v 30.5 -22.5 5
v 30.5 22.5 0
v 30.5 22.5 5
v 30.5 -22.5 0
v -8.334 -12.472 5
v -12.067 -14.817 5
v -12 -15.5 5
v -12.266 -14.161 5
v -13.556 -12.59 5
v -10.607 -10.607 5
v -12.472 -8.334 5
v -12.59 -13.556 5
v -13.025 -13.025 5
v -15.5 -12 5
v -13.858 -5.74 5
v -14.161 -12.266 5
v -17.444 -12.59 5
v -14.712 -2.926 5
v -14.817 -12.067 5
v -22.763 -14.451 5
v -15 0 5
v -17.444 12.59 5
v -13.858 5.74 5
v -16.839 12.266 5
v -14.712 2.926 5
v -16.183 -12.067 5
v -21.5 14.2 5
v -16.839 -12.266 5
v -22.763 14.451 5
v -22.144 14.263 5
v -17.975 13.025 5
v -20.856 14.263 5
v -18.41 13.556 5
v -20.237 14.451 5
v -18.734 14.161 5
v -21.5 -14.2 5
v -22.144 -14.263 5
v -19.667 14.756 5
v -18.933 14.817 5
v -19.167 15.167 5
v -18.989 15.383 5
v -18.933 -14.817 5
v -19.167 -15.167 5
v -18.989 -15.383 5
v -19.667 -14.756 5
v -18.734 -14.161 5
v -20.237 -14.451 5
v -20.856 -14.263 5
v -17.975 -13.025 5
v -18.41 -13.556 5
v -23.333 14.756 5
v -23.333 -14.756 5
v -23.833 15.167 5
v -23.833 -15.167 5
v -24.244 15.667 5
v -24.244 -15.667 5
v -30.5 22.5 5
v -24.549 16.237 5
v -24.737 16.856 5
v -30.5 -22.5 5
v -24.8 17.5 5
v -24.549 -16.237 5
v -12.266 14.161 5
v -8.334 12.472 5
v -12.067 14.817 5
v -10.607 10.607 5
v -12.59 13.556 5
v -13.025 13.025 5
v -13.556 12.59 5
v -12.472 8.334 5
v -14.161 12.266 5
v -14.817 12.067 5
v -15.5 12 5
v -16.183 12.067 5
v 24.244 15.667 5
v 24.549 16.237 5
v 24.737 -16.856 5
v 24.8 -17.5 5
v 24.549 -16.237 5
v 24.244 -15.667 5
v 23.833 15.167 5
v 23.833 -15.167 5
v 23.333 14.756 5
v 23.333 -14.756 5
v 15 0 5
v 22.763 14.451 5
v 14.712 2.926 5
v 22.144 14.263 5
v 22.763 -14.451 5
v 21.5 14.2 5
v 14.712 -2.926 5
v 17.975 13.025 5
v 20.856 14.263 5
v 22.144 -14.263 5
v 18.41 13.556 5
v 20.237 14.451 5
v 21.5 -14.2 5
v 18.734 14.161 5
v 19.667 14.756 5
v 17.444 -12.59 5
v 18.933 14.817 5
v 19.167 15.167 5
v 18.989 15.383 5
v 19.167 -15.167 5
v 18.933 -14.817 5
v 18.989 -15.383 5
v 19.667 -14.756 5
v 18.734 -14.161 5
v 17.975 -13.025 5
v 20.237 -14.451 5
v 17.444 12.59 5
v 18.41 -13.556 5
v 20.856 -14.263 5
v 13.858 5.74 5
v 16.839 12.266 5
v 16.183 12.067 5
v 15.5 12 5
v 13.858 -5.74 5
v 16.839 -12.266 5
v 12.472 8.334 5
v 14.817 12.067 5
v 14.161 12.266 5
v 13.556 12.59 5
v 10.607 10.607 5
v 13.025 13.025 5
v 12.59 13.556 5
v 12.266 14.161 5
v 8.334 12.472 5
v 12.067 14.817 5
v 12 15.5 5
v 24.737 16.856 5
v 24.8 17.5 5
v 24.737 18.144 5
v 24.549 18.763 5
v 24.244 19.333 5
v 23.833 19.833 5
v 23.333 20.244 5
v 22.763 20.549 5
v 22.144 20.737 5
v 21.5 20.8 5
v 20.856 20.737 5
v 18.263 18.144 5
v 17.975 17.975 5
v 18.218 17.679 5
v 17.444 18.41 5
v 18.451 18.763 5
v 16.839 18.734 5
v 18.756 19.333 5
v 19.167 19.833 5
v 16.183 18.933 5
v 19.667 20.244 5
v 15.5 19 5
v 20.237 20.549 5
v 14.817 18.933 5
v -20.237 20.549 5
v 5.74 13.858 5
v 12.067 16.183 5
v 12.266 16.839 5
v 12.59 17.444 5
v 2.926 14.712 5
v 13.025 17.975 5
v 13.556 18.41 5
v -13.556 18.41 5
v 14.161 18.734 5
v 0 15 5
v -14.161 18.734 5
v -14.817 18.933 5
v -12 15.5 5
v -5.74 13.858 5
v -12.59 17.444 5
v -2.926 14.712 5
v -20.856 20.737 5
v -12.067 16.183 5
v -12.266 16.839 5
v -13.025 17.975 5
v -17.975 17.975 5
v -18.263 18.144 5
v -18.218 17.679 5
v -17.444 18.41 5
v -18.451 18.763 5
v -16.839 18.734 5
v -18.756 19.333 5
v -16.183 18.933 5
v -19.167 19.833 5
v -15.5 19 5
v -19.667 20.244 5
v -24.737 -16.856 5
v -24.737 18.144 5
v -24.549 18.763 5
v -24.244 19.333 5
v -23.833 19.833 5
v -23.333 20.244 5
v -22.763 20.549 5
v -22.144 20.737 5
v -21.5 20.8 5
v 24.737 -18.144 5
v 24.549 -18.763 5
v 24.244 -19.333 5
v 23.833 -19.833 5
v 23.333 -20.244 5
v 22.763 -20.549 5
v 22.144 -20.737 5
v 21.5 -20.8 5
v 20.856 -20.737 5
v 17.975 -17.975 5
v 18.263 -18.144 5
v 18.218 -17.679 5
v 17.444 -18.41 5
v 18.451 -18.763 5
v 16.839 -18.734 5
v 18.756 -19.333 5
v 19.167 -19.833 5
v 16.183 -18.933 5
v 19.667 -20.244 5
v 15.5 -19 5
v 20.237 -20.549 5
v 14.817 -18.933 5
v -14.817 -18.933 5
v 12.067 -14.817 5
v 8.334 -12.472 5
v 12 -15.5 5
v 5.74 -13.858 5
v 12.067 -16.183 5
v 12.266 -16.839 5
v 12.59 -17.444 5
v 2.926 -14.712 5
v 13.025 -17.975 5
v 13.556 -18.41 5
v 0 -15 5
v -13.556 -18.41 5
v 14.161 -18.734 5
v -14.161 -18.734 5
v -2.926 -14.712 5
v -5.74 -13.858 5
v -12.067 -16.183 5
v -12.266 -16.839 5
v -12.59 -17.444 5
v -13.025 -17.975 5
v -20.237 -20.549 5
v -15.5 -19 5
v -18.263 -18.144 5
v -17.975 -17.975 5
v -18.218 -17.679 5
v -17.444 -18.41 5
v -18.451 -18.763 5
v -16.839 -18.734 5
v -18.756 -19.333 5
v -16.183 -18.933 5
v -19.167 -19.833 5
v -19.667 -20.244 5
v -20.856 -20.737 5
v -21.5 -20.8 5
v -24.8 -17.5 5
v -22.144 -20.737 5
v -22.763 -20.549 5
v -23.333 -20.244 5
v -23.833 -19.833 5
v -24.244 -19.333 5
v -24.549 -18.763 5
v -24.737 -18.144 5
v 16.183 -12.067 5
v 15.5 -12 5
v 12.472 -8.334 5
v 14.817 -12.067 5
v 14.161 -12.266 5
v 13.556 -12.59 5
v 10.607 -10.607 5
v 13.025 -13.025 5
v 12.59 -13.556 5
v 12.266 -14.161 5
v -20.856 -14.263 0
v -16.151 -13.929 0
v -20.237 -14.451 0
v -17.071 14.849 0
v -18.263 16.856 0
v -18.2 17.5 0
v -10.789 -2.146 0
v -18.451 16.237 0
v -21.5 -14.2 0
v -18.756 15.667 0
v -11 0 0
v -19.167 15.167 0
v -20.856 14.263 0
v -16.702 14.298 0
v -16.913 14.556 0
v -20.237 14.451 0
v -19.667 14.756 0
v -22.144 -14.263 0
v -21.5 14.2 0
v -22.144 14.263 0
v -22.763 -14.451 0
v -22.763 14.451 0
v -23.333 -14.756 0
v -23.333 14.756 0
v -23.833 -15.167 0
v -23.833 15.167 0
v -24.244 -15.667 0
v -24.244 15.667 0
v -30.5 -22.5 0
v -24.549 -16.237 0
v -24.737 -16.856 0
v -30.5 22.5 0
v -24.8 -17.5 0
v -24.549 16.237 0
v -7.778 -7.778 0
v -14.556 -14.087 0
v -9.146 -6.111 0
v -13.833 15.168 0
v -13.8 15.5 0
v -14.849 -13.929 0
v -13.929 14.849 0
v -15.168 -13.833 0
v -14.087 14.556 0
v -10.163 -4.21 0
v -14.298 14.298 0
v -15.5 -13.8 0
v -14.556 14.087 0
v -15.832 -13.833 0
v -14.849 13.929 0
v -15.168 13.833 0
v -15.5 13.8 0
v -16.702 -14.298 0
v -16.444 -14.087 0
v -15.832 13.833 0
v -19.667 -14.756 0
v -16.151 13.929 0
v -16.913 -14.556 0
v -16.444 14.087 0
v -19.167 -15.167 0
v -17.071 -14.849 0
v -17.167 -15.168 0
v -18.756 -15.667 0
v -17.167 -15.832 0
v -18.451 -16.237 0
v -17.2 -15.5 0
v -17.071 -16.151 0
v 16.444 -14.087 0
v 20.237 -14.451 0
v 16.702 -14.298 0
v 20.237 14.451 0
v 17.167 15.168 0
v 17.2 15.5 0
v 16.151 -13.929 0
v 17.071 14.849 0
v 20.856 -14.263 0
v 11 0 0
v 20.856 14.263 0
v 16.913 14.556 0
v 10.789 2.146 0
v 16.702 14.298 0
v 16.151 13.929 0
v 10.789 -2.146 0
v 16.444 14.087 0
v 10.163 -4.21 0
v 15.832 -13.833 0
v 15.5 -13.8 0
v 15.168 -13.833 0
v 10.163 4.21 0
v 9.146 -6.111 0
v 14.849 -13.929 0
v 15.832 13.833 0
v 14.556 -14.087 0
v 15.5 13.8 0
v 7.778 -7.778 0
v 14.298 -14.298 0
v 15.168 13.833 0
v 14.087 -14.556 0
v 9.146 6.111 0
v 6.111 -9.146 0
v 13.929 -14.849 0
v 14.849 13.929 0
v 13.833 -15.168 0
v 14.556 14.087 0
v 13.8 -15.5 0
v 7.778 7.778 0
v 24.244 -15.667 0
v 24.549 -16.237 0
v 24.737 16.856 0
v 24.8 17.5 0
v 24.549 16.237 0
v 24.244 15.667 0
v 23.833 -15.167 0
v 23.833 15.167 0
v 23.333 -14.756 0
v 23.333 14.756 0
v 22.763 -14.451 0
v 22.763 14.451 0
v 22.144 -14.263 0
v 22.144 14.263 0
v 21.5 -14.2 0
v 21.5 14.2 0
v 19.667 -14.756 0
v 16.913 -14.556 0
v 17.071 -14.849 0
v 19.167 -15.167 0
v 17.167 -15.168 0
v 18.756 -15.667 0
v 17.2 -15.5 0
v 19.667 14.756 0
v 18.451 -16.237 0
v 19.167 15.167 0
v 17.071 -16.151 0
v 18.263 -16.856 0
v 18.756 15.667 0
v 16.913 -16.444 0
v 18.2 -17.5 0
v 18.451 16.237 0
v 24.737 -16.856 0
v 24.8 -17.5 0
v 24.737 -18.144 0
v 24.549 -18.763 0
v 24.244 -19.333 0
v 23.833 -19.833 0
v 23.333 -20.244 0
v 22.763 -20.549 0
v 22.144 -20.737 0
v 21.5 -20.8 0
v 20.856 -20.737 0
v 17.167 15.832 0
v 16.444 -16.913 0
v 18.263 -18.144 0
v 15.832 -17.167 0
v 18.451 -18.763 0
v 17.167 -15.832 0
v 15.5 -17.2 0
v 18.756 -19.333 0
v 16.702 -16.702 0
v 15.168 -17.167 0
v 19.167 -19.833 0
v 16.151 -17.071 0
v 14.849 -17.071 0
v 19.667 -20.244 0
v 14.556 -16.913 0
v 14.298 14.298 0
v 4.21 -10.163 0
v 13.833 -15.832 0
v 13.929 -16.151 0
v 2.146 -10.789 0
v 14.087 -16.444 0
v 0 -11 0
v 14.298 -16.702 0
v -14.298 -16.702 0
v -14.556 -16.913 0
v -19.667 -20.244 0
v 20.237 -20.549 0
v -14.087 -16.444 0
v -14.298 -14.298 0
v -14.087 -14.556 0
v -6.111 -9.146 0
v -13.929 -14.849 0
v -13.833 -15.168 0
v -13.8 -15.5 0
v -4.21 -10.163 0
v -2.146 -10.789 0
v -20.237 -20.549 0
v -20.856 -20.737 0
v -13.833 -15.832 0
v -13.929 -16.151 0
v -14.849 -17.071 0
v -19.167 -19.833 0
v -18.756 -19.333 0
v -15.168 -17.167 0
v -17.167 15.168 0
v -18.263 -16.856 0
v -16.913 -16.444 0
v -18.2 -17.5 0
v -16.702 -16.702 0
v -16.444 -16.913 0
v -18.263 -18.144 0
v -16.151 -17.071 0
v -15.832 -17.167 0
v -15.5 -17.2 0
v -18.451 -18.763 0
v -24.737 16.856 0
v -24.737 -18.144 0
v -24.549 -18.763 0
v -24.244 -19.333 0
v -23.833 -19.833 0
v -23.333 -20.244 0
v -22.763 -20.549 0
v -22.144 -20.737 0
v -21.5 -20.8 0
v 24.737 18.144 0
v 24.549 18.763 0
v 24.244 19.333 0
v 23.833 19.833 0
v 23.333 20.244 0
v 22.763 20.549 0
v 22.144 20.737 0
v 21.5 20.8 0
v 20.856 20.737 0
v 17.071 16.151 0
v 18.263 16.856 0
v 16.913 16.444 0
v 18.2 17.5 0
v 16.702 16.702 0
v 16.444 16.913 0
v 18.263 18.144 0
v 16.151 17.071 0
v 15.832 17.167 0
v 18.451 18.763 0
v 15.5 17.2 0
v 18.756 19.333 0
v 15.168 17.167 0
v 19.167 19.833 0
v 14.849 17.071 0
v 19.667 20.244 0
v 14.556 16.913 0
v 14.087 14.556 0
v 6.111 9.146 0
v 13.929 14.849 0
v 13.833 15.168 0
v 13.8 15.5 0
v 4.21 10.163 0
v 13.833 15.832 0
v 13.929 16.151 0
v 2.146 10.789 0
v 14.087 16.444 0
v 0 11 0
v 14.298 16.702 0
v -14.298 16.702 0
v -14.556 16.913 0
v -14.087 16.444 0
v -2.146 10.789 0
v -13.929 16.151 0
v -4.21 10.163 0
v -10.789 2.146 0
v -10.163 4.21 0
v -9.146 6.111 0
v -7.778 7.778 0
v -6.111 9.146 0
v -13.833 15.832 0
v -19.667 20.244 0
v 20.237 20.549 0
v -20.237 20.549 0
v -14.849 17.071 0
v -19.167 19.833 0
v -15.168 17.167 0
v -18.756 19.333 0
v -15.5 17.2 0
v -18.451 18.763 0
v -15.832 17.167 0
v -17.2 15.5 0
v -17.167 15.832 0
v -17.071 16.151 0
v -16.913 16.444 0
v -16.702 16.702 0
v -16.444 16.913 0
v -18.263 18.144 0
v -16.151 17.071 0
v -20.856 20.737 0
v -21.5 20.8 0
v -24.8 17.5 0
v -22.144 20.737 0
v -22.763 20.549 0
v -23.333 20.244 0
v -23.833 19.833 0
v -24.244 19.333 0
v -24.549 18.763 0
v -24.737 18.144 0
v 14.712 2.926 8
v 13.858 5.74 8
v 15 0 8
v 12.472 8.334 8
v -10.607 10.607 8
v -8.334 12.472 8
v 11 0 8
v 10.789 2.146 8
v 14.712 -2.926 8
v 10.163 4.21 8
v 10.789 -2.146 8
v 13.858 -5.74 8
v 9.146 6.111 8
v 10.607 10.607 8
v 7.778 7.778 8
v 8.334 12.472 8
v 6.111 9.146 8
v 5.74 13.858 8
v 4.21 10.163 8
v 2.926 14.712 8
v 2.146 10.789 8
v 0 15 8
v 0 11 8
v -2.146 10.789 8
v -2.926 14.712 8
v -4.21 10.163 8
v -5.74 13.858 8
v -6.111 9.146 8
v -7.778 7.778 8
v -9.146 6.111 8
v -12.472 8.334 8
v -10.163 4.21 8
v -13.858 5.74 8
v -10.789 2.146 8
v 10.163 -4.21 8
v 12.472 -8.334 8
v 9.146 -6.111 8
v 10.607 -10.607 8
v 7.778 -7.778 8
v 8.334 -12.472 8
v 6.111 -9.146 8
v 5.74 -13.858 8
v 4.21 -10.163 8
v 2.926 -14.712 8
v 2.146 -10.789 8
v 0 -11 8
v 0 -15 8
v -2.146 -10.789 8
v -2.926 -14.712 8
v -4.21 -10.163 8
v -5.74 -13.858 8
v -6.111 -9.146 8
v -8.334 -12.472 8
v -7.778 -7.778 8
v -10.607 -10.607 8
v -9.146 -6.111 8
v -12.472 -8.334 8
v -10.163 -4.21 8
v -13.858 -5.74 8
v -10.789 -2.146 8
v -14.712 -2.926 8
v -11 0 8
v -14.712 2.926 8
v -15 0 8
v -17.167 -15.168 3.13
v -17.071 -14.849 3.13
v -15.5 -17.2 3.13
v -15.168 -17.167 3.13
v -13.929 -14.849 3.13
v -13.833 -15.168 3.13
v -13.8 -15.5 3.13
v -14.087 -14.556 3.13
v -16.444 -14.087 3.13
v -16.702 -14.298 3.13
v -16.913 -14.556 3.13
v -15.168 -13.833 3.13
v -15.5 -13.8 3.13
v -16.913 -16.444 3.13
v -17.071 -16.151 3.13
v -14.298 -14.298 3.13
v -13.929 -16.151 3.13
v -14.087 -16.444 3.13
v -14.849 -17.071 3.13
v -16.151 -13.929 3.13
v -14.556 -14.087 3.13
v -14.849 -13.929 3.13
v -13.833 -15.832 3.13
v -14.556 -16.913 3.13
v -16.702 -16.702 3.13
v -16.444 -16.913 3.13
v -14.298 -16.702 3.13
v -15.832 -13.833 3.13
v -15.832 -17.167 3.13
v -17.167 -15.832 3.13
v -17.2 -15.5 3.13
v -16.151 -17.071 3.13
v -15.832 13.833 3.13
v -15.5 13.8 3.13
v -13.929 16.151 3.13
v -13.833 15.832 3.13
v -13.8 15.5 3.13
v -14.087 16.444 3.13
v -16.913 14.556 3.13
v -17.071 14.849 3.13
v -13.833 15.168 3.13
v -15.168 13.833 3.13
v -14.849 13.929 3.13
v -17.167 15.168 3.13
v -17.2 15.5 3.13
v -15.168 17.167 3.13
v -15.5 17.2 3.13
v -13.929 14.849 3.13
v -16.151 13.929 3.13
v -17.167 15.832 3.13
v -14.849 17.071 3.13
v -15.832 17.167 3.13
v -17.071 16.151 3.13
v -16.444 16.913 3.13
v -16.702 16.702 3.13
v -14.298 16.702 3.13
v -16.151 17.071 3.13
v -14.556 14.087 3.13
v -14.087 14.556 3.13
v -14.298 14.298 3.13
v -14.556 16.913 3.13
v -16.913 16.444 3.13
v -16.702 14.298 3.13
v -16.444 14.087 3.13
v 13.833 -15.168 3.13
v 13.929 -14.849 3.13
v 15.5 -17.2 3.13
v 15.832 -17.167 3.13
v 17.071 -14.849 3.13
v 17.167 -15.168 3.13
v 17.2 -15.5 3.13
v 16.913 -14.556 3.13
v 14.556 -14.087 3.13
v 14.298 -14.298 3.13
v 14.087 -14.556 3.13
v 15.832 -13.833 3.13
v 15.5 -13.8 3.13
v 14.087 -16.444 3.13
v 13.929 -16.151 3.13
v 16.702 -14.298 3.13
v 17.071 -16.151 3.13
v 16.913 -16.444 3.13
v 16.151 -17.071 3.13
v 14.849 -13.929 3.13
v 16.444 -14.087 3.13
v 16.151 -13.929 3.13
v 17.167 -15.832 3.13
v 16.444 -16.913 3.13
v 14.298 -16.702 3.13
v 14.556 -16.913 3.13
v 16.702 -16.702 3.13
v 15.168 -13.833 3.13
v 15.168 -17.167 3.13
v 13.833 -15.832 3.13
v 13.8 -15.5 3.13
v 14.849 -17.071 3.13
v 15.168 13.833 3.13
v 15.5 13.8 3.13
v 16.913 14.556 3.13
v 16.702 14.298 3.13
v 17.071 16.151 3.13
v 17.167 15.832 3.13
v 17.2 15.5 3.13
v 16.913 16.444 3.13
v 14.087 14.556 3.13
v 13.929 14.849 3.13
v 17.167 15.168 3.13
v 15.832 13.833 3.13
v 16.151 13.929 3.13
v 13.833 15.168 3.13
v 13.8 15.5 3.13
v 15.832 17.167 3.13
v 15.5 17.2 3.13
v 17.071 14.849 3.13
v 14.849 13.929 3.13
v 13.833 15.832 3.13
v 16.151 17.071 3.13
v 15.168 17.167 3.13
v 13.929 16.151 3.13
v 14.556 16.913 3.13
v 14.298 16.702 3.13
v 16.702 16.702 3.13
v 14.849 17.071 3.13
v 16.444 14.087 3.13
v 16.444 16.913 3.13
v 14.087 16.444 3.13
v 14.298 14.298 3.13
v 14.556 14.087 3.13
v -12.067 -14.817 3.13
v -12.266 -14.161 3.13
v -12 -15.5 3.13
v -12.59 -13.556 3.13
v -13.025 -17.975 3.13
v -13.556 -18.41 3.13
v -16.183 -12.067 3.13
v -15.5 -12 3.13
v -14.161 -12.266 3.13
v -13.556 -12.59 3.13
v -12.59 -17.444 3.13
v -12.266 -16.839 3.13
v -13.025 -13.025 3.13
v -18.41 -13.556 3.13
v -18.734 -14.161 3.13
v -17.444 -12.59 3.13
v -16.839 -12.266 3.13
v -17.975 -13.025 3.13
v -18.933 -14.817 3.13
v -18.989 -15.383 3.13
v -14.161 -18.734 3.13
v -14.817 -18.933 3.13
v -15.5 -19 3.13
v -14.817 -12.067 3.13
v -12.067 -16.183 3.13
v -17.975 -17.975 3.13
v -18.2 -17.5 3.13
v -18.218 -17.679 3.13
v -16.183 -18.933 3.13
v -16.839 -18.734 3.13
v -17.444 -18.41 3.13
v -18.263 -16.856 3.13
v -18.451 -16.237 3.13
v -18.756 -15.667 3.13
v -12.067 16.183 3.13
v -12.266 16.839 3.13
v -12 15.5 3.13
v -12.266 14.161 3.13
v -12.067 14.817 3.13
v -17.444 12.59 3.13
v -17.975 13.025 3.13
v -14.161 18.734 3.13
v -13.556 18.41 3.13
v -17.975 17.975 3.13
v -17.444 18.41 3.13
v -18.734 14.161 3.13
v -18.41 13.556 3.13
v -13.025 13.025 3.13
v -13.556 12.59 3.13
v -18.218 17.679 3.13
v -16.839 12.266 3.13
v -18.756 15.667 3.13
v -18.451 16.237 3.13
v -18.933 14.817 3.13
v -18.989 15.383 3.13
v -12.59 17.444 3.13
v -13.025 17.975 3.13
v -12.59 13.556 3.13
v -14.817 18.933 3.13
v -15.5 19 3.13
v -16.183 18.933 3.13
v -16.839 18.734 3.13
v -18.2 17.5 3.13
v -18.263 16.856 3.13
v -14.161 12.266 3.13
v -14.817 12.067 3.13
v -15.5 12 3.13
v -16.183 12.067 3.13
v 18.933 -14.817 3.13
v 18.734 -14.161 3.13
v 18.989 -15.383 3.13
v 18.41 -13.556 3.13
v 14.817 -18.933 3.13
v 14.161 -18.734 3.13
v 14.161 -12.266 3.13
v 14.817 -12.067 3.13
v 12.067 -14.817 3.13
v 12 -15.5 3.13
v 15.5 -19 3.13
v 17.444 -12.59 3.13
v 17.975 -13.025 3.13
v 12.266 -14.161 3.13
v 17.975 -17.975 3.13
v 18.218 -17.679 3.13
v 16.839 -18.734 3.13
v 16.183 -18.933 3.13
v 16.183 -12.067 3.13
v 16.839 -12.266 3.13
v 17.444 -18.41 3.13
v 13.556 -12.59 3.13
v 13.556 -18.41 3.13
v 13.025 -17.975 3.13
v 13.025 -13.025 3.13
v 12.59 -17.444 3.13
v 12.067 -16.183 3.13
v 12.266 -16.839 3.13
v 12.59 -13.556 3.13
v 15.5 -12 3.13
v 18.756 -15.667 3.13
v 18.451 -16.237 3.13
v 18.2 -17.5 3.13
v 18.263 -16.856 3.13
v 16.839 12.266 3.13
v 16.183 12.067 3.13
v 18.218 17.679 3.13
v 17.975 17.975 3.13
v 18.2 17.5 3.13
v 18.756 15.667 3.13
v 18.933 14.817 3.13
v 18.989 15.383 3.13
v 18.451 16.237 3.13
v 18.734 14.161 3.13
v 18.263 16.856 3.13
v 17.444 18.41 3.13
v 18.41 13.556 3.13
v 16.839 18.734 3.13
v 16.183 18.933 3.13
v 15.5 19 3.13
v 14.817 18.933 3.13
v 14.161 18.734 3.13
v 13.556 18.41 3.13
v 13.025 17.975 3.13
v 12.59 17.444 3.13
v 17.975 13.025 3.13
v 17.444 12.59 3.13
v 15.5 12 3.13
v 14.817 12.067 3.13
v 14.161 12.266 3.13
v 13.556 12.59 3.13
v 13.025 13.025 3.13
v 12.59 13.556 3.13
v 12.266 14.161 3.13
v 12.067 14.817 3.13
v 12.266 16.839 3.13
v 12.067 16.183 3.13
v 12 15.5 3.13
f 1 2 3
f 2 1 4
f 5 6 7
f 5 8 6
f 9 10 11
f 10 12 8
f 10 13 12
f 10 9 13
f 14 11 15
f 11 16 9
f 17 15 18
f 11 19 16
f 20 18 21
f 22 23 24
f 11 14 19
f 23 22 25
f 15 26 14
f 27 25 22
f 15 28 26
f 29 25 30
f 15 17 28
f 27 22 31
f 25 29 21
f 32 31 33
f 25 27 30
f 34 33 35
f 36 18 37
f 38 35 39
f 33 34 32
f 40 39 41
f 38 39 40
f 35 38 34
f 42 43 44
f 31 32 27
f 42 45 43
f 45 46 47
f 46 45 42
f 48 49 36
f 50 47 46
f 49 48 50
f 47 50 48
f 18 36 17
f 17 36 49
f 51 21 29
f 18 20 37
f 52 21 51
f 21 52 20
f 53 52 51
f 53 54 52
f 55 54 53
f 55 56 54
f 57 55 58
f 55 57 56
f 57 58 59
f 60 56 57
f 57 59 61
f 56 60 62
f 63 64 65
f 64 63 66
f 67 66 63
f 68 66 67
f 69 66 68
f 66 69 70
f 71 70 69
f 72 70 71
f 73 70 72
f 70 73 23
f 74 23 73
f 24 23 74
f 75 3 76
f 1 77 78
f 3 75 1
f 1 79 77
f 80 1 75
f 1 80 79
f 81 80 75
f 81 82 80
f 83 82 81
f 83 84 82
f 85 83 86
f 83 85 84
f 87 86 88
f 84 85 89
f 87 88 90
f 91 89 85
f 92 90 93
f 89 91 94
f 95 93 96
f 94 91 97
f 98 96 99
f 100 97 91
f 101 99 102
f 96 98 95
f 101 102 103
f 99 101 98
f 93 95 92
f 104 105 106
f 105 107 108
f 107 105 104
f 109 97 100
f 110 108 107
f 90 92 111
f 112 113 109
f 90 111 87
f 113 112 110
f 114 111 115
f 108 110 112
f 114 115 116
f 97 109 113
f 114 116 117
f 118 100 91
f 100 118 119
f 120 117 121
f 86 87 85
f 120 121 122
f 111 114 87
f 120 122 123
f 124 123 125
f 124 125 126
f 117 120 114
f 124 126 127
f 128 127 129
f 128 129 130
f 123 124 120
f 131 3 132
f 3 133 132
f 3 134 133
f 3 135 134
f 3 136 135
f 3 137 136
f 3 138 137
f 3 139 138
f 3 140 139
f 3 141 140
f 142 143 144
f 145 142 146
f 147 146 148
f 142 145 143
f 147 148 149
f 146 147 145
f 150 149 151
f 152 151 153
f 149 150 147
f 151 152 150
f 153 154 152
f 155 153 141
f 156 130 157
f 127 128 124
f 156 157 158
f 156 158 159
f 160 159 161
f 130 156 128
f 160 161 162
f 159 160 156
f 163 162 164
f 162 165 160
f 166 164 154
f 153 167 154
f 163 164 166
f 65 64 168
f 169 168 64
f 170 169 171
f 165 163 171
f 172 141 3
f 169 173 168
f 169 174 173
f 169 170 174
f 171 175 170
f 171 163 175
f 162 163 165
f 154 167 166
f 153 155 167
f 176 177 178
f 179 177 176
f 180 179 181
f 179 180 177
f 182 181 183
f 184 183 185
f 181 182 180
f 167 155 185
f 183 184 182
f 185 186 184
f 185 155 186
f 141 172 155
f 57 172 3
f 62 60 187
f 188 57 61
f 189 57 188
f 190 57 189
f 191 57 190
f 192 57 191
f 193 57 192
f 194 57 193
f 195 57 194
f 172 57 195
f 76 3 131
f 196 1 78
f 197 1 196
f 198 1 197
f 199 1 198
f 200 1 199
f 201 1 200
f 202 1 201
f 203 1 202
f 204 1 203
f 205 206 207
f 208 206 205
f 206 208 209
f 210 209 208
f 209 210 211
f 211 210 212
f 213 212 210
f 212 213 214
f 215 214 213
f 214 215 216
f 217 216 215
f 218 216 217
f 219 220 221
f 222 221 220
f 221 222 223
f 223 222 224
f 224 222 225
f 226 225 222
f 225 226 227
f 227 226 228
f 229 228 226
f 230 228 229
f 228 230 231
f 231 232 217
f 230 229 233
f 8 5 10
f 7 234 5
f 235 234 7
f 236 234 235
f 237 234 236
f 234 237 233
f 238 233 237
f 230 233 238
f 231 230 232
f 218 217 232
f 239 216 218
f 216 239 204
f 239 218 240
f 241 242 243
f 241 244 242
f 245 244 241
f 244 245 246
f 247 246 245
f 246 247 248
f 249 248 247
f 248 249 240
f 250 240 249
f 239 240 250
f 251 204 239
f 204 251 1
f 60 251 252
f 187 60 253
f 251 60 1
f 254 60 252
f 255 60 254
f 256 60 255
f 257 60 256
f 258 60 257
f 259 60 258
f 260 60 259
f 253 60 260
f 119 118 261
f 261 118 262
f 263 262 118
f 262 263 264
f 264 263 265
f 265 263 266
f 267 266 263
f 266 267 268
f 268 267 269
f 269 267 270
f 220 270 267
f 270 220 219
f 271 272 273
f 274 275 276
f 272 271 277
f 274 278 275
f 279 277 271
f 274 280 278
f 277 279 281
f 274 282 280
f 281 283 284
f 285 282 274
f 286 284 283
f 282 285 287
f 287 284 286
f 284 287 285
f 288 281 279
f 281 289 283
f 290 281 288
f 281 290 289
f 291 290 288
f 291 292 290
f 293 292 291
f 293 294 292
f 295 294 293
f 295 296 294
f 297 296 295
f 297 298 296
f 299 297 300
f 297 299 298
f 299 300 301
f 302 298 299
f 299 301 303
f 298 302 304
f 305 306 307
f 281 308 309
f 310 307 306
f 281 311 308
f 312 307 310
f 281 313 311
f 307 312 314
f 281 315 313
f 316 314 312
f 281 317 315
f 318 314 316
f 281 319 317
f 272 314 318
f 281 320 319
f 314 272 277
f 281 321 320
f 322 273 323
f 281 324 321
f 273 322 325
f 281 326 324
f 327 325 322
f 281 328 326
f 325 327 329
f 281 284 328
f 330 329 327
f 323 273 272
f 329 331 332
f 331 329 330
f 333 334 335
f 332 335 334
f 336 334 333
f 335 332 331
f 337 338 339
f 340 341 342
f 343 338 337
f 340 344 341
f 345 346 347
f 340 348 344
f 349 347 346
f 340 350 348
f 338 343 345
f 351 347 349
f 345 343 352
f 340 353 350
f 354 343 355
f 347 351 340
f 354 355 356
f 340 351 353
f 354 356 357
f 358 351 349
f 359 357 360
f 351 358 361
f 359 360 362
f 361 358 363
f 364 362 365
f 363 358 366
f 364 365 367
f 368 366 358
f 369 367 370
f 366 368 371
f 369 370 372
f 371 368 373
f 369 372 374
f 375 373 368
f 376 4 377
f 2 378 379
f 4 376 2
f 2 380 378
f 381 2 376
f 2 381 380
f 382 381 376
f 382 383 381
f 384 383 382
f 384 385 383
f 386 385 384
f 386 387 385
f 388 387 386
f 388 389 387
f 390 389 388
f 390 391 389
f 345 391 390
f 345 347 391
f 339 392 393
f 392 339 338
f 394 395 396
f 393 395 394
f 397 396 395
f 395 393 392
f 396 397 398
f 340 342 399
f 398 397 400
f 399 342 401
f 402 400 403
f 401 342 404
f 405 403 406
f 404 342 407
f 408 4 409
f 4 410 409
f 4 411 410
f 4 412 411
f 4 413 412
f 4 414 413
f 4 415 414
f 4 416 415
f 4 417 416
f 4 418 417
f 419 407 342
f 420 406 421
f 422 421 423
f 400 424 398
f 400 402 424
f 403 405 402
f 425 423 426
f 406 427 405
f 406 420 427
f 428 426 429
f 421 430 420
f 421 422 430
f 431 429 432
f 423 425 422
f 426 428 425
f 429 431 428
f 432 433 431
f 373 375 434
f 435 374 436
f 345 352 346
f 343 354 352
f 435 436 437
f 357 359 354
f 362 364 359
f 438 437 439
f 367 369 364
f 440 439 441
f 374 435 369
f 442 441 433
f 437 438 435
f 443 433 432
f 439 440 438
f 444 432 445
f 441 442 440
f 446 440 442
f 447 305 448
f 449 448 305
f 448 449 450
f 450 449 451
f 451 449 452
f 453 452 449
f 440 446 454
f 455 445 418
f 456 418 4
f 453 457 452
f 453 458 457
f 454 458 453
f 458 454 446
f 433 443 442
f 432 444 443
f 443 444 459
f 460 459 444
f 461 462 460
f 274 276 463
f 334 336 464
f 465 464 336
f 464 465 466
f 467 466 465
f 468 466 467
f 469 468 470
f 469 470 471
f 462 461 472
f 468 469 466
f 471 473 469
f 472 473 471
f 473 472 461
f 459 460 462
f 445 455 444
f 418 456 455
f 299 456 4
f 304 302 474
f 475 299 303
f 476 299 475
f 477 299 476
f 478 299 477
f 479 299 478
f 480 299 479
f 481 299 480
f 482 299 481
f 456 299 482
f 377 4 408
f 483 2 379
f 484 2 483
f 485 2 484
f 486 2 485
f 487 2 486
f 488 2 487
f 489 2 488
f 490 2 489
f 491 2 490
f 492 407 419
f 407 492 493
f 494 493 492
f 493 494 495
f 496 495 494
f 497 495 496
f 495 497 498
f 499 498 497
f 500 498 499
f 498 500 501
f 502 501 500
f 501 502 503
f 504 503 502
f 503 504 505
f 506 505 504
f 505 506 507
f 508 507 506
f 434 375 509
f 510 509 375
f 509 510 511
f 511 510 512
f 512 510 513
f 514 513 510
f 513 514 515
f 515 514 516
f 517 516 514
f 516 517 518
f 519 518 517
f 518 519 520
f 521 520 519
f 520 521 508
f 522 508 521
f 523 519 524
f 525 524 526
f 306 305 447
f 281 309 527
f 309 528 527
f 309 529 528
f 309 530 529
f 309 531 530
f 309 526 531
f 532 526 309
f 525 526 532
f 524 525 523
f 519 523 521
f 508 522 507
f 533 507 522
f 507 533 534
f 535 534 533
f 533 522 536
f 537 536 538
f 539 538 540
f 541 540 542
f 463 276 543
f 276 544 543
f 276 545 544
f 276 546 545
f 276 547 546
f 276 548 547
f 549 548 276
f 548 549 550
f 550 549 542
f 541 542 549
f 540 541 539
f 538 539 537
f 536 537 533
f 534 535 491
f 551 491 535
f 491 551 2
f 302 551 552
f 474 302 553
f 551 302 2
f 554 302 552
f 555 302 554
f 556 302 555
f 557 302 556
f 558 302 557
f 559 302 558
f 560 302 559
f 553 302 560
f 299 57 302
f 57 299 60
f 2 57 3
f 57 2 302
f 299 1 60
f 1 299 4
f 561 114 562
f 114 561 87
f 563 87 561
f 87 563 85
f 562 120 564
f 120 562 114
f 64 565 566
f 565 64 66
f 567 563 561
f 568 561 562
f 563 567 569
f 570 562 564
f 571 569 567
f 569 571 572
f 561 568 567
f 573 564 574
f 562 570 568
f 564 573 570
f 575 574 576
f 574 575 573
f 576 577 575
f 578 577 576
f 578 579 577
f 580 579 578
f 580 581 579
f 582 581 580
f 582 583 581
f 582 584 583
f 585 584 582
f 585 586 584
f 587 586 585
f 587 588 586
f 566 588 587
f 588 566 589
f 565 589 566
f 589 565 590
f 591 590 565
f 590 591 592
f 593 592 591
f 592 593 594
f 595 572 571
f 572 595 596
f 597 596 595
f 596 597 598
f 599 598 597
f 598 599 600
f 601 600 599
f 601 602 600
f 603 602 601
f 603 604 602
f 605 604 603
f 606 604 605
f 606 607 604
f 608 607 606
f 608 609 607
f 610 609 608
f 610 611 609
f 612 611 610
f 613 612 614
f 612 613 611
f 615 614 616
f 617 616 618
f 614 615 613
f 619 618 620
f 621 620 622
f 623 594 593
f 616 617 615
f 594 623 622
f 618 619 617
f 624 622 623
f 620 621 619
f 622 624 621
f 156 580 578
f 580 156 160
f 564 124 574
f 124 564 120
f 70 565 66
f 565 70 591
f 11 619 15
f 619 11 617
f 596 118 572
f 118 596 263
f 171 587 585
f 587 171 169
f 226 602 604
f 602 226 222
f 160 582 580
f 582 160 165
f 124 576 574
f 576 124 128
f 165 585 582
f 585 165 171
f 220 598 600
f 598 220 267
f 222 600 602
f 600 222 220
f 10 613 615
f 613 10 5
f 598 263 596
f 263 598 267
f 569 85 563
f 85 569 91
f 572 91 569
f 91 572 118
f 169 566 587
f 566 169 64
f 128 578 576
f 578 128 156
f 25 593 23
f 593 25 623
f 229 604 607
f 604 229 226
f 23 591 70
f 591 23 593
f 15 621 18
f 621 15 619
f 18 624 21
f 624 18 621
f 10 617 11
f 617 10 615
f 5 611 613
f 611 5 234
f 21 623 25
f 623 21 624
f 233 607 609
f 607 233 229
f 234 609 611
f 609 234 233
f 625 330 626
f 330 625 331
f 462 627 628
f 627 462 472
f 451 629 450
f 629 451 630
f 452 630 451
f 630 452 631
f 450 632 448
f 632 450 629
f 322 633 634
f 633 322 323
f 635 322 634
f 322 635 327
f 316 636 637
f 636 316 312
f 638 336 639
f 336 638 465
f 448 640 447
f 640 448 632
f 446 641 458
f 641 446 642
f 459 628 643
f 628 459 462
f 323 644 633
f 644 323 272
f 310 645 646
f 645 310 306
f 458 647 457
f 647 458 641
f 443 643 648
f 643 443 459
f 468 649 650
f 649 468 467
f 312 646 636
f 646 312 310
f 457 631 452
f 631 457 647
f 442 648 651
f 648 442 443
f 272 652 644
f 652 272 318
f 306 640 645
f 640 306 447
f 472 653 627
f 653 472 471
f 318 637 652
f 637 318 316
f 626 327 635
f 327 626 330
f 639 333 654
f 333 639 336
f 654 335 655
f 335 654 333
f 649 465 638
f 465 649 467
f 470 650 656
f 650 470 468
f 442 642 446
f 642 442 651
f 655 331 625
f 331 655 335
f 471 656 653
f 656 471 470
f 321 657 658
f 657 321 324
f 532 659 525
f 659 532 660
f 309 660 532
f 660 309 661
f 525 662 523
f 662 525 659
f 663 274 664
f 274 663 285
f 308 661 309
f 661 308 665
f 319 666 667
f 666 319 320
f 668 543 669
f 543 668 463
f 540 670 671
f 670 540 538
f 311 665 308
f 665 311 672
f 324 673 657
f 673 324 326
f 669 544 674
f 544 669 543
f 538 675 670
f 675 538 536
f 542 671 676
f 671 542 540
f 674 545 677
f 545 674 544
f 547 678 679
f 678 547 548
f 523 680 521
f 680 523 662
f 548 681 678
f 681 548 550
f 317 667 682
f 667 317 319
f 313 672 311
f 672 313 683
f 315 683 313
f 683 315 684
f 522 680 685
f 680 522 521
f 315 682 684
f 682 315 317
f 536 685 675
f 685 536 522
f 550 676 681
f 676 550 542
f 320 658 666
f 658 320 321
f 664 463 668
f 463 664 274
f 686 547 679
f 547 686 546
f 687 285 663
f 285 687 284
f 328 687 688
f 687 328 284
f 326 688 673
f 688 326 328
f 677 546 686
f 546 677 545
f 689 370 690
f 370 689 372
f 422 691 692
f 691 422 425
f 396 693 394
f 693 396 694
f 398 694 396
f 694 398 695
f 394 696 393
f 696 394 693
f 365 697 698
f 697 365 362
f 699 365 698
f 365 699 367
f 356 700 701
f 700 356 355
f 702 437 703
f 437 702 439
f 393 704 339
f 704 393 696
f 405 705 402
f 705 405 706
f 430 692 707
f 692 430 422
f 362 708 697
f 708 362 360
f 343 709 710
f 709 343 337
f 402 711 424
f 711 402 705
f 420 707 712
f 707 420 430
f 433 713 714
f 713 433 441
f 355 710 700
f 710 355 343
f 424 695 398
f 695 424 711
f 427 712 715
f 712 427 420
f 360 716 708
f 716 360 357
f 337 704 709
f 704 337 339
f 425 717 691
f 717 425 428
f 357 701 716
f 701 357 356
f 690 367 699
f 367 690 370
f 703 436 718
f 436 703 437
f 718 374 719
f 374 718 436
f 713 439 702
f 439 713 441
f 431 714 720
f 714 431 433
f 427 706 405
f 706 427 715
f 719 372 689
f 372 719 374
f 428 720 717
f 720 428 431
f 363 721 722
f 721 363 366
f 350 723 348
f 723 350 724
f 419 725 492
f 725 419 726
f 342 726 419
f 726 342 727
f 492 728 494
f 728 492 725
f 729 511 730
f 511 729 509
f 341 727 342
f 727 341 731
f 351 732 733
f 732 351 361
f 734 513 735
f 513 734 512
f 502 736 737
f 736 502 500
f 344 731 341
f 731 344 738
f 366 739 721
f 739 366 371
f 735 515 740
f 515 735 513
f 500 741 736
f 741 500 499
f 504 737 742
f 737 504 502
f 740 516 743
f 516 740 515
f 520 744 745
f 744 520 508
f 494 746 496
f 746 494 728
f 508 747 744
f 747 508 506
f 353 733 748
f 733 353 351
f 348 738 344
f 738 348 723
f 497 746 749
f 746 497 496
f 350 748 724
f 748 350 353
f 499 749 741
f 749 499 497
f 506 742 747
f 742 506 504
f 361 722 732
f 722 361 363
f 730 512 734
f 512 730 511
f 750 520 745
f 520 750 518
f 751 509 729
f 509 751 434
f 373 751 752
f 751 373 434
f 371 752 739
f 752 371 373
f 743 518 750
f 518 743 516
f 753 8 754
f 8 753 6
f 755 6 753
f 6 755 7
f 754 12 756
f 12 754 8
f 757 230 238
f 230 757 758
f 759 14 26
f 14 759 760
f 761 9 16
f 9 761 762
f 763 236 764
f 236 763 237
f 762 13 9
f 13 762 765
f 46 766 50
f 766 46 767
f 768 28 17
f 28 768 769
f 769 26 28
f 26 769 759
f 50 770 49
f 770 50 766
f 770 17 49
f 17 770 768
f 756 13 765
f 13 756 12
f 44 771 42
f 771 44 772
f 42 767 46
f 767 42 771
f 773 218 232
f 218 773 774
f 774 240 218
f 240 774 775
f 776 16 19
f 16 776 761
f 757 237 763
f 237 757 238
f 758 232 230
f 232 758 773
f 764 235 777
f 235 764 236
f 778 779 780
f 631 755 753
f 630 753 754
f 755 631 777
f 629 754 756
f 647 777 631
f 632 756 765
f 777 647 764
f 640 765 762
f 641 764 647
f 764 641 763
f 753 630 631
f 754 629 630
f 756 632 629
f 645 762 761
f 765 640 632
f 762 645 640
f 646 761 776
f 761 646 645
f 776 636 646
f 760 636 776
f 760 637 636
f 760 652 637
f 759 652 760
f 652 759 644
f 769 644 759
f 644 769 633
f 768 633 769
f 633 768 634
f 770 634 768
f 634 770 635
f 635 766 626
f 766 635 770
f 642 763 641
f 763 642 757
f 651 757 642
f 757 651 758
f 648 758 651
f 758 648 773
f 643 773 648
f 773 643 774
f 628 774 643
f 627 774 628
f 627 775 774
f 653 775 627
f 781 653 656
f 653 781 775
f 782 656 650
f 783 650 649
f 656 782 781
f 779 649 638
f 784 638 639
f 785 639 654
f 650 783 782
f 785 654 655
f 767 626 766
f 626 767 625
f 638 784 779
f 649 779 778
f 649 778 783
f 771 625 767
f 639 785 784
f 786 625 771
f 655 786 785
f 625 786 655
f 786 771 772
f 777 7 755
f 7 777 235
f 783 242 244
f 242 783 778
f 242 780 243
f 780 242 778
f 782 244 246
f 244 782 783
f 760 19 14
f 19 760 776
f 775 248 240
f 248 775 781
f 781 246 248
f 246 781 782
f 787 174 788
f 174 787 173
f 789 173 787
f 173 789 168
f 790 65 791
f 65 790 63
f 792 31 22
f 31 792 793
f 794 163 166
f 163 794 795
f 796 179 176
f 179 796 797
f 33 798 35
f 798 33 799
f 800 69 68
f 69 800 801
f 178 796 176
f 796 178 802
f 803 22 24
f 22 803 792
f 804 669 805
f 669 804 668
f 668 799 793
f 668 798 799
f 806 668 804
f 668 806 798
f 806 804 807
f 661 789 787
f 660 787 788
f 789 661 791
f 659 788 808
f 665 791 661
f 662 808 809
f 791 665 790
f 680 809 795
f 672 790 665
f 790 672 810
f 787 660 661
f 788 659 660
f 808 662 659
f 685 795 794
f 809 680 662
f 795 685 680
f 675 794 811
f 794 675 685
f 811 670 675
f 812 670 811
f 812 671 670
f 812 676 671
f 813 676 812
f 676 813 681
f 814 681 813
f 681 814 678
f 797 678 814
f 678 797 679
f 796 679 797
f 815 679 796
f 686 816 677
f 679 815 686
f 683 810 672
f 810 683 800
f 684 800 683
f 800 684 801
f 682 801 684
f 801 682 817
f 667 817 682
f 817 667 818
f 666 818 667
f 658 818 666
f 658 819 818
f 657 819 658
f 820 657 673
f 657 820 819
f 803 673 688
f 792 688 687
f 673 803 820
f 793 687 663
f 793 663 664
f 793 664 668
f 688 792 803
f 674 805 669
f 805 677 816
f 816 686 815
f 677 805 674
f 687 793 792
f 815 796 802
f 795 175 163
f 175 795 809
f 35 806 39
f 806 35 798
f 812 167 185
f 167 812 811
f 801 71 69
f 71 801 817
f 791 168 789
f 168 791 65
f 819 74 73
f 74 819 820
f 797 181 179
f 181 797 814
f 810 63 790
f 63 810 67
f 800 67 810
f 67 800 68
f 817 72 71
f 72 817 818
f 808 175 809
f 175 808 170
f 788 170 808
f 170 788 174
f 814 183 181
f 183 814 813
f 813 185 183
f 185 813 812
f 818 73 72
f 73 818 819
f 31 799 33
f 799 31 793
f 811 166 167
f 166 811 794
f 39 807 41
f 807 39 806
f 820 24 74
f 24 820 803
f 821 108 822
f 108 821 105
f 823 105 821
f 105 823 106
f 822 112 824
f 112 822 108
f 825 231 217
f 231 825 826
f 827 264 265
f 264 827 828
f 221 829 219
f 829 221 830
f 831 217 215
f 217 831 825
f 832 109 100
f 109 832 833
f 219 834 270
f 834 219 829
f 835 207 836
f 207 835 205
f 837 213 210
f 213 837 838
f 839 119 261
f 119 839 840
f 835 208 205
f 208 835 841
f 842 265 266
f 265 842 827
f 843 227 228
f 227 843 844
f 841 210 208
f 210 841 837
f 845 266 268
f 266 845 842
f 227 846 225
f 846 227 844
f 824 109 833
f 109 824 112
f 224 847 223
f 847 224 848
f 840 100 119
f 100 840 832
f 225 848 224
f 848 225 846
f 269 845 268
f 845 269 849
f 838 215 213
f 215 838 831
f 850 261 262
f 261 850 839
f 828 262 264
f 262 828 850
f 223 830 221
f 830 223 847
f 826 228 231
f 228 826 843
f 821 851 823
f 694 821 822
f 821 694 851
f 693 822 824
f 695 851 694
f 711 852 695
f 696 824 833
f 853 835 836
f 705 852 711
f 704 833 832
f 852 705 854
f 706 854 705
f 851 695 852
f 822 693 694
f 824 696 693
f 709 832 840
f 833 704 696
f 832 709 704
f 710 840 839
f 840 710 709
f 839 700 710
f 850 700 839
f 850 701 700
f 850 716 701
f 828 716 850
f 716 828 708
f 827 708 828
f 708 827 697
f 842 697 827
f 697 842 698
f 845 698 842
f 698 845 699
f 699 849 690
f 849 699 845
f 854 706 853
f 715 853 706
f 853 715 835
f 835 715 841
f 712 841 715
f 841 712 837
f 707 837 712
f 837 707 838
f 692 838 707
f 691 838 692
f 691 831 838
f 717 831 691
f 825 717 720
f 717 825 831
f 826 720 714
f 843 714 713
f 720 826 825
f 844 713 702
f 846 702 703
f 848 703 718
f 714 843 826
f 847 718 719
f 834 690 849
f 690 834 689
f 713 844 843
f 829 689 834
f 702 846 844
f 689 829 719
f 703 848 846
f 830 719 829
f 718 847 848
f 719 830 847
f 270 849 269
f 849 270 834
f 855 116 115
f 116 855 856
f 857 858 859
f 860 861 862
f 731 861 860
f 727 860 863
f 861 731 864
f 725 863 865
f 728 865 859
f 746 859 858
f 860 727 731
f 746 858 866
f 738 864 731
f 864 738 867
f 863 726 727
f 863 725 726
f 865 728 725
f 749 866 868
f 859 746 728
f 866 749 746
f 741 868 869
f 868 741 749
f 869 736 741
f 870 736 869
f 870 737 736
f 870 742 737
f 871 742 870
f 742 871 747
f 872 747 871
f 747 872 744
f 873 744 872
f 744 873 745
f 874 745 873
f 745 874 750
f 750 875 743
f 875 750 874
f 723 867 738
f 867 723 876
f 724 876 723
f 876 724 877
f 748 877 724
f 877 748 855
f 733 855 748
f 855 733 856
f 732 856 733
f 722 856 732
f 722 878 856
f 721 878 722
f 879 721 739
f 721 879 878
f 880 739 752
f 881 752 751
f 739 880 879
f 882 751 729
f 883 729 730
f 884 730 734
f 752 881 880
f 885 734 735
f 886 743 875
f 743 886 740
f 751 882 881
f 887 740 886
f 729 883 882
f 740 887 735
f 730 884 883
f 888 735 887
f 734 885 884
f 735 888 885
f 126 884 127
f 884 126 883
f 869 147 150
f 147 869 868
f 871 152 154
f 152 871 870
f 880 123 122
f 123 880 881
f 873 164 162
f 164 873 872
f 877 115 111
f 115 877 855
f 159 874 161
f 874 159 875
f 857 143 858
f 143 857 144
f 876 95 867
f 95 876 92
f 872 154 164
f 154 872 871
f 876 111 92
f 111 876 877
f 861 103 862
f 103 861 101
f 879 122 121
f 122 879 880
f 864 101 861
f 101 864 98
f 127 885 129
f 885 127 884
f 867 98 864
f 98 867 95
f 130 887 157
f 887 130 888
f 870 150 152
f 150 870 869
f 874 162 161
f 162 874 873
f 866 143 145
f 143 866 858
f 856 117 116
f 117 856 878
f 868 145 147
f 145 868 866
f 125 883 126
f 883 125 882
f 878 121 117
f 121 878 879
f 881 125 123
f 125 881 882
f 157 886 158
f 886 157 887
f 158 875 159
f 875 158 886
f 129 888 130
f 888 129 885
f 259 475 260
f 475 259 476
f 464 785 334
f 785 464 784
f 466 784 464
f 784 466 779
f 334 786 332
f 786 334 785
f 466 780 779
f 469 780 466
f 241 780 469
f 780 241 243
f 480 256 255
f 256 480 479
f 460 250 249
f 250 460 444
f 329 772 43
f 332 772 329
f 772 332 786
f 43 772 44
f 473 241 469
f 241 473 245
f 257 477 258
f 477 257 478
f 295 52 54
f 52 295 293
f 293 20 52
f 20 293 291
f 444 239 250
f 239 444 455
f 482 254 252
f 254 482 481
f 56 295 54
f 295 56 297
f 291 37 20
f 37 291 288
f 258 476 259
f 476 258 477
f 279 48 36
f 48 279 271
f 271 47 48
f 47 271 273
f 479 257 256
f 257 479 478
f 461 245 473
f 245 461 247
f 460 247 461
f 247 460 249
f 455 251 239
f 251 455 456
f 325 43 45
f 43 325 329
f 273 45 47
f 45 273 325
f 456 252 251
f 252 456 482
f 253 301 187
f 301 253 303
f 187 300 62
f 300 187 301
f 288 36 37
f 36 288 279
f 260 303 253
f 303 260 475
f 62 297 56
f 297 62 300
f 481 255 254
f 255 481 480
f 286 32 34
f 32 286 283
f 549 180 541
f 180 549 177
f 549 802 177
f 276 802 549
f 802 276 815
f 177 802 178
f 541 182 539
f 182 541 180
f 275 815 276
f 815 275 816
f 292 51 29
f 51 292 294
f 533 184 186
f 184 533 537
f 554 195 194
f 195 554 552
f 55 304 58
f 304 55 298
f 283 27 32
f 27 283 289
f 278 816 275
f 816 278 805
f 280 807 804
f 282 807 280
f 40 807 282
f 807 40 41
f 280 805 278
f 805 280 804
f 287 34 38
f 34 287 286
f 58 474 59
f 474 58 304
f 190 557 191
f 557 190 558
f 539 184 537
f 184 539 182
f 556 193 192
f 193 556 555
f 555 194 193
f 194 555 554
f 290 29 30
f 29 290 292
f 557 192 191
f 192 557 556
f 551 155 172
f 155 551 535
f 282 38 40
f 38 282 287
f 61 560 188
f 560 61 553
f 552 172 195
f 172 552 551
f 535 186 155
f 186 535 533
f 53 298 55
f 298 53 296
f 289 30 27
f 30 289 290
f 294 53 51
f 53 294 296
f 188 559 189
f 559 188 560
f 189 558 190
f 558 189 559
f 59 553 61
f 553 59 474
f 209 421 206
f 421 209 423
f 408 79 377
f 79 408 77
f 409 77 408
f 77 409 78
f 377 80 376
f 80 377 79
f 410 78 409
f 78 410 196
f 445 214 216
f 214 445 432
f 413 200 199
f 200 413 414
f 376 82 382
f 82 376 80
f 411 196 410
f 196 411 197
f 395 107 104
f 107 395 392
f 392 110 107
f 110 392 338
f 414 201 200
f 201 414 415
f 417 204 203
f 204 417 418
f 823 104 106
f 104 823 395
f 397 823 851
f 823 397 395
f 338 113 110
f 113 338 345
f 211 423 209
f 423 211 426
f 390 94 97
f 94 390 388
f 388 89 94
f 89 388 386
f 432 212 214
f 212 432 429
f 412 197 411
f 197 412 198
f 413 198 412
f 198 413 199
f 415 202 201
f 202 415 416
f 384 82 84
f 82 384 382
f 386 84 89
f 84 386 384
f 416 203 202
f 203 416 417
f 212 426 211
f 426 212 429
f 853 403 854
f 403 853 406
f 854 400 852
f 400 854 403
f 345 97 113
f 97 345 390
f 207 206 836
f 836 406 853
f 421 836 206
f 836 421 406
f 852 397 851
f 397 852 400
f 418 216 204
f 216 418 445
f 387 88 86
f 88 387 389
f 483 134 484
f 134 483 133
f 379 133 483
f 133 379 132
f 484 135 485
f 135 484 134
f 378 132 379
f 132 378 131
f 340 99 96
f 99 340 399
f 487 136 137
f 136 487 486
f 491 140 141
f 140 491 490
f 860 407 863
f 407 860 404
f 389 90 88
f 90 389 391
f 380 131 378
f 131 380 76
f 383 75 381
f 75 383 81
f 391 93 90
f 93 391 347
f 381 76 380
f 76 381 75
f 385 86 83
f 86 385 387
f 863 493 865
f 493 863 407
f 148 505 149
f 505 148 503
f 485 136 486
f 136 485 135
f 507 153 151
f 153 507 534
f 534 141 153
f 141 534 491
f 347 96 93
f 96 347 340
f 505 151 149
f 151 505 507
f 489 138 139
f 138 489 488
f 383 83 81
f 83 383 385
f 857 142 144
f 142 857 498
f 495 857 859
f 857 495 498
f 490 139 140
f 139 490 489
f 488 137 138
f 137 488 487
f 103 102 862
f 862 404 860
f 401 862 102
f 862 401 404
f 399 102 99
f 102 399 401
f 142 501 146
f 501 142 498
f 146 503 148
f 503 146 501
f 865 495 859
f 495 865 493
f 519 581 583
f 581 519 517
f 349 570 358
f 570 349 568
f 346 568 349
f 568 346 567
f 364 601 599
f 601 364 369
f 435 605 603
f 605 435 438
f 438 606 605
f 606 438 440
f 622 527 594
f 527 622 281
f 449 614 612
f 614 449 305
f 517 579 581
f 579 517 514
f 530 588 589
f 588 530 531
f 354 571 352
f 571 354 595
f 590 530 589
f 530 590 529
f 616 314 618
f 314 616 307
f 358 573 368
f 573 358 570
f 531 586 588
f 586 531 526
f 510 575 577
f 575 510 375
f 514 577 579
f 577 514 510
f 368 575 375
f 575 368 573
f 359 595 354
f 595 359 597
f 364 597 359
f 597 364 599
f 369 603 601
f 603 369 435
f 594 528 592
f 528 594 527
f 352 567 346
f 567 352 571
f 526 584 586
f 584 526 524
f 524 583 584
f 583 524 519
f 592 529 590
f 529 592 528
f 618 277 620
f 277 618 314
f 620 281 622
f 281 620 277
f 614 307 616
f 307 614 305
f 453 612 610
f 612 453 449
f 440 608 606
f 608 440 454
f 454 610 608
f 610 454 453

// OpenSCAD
$fn = 32;

// ----------------------------------------------------------------------
// Motor mount plate: NEMA17, 61 x 45 x 8 mm
// ----------------------------------------------------------------------

// --- parameters (mm) ---
base_x = 61;              // plate length, X
base_y = 45;              // plate width, Y
thick = 5;                // plate thickness
bolt_pitch = 31;          // NEMA17 bolt spacing
motor_d = 3.4;            // NEMA17 screw clearance
boss_hole = 22;           // pilot boss bore
cb_d = 7;                 // counterbore seat
cb_h = 1.87;              // counterbore depth
boss_d = 30;              // raised pilot ring
boss_h = 3;               // raised pilot ring height
second_d = 6.6;           // second fastener hole

module plate() {
  translate([-base_x / 2, -base_y / 2, 0]) cube([base_x, base_y, thick]);
}

module motor_holes() {
  for (sx = [-1, 1]) for (sy = [-1, 1])
    translate([sx * bolt_pitch / 2, sy * bolt_pitch / 2, -1])
      cylinder(h = thick + 2, d = motor_d);
}
module motor_counterbores() {
  for (sx = [-1, 1]) for (sy = [-1, 1])
    translate([sx * bolt_pitch / 2, sy * bolt_pitch / 2, thick - cb_h])
      cylinder(h = cb_h + 0.6, d = cb_d);
}
module pilot_ring() {
  translate([0, 0, thick - 1]) cylinder(h = boss_h + 1, d = boss_d);
}

difference() {
  union() {
    plate();
    pilot_ring();
  }
  motor_holes();
  translate([0, 0, -1]) cylinder(h = thick + boss_h + 2, d = boss_hole);
  motor_counterbores();
  for (sx = [-1, 1]) for (sy = [-1, 1])
    translate([sx * 21.5, sy * 17.5, -1]) cylinder(h = thick + 2, d = second_d);
}
